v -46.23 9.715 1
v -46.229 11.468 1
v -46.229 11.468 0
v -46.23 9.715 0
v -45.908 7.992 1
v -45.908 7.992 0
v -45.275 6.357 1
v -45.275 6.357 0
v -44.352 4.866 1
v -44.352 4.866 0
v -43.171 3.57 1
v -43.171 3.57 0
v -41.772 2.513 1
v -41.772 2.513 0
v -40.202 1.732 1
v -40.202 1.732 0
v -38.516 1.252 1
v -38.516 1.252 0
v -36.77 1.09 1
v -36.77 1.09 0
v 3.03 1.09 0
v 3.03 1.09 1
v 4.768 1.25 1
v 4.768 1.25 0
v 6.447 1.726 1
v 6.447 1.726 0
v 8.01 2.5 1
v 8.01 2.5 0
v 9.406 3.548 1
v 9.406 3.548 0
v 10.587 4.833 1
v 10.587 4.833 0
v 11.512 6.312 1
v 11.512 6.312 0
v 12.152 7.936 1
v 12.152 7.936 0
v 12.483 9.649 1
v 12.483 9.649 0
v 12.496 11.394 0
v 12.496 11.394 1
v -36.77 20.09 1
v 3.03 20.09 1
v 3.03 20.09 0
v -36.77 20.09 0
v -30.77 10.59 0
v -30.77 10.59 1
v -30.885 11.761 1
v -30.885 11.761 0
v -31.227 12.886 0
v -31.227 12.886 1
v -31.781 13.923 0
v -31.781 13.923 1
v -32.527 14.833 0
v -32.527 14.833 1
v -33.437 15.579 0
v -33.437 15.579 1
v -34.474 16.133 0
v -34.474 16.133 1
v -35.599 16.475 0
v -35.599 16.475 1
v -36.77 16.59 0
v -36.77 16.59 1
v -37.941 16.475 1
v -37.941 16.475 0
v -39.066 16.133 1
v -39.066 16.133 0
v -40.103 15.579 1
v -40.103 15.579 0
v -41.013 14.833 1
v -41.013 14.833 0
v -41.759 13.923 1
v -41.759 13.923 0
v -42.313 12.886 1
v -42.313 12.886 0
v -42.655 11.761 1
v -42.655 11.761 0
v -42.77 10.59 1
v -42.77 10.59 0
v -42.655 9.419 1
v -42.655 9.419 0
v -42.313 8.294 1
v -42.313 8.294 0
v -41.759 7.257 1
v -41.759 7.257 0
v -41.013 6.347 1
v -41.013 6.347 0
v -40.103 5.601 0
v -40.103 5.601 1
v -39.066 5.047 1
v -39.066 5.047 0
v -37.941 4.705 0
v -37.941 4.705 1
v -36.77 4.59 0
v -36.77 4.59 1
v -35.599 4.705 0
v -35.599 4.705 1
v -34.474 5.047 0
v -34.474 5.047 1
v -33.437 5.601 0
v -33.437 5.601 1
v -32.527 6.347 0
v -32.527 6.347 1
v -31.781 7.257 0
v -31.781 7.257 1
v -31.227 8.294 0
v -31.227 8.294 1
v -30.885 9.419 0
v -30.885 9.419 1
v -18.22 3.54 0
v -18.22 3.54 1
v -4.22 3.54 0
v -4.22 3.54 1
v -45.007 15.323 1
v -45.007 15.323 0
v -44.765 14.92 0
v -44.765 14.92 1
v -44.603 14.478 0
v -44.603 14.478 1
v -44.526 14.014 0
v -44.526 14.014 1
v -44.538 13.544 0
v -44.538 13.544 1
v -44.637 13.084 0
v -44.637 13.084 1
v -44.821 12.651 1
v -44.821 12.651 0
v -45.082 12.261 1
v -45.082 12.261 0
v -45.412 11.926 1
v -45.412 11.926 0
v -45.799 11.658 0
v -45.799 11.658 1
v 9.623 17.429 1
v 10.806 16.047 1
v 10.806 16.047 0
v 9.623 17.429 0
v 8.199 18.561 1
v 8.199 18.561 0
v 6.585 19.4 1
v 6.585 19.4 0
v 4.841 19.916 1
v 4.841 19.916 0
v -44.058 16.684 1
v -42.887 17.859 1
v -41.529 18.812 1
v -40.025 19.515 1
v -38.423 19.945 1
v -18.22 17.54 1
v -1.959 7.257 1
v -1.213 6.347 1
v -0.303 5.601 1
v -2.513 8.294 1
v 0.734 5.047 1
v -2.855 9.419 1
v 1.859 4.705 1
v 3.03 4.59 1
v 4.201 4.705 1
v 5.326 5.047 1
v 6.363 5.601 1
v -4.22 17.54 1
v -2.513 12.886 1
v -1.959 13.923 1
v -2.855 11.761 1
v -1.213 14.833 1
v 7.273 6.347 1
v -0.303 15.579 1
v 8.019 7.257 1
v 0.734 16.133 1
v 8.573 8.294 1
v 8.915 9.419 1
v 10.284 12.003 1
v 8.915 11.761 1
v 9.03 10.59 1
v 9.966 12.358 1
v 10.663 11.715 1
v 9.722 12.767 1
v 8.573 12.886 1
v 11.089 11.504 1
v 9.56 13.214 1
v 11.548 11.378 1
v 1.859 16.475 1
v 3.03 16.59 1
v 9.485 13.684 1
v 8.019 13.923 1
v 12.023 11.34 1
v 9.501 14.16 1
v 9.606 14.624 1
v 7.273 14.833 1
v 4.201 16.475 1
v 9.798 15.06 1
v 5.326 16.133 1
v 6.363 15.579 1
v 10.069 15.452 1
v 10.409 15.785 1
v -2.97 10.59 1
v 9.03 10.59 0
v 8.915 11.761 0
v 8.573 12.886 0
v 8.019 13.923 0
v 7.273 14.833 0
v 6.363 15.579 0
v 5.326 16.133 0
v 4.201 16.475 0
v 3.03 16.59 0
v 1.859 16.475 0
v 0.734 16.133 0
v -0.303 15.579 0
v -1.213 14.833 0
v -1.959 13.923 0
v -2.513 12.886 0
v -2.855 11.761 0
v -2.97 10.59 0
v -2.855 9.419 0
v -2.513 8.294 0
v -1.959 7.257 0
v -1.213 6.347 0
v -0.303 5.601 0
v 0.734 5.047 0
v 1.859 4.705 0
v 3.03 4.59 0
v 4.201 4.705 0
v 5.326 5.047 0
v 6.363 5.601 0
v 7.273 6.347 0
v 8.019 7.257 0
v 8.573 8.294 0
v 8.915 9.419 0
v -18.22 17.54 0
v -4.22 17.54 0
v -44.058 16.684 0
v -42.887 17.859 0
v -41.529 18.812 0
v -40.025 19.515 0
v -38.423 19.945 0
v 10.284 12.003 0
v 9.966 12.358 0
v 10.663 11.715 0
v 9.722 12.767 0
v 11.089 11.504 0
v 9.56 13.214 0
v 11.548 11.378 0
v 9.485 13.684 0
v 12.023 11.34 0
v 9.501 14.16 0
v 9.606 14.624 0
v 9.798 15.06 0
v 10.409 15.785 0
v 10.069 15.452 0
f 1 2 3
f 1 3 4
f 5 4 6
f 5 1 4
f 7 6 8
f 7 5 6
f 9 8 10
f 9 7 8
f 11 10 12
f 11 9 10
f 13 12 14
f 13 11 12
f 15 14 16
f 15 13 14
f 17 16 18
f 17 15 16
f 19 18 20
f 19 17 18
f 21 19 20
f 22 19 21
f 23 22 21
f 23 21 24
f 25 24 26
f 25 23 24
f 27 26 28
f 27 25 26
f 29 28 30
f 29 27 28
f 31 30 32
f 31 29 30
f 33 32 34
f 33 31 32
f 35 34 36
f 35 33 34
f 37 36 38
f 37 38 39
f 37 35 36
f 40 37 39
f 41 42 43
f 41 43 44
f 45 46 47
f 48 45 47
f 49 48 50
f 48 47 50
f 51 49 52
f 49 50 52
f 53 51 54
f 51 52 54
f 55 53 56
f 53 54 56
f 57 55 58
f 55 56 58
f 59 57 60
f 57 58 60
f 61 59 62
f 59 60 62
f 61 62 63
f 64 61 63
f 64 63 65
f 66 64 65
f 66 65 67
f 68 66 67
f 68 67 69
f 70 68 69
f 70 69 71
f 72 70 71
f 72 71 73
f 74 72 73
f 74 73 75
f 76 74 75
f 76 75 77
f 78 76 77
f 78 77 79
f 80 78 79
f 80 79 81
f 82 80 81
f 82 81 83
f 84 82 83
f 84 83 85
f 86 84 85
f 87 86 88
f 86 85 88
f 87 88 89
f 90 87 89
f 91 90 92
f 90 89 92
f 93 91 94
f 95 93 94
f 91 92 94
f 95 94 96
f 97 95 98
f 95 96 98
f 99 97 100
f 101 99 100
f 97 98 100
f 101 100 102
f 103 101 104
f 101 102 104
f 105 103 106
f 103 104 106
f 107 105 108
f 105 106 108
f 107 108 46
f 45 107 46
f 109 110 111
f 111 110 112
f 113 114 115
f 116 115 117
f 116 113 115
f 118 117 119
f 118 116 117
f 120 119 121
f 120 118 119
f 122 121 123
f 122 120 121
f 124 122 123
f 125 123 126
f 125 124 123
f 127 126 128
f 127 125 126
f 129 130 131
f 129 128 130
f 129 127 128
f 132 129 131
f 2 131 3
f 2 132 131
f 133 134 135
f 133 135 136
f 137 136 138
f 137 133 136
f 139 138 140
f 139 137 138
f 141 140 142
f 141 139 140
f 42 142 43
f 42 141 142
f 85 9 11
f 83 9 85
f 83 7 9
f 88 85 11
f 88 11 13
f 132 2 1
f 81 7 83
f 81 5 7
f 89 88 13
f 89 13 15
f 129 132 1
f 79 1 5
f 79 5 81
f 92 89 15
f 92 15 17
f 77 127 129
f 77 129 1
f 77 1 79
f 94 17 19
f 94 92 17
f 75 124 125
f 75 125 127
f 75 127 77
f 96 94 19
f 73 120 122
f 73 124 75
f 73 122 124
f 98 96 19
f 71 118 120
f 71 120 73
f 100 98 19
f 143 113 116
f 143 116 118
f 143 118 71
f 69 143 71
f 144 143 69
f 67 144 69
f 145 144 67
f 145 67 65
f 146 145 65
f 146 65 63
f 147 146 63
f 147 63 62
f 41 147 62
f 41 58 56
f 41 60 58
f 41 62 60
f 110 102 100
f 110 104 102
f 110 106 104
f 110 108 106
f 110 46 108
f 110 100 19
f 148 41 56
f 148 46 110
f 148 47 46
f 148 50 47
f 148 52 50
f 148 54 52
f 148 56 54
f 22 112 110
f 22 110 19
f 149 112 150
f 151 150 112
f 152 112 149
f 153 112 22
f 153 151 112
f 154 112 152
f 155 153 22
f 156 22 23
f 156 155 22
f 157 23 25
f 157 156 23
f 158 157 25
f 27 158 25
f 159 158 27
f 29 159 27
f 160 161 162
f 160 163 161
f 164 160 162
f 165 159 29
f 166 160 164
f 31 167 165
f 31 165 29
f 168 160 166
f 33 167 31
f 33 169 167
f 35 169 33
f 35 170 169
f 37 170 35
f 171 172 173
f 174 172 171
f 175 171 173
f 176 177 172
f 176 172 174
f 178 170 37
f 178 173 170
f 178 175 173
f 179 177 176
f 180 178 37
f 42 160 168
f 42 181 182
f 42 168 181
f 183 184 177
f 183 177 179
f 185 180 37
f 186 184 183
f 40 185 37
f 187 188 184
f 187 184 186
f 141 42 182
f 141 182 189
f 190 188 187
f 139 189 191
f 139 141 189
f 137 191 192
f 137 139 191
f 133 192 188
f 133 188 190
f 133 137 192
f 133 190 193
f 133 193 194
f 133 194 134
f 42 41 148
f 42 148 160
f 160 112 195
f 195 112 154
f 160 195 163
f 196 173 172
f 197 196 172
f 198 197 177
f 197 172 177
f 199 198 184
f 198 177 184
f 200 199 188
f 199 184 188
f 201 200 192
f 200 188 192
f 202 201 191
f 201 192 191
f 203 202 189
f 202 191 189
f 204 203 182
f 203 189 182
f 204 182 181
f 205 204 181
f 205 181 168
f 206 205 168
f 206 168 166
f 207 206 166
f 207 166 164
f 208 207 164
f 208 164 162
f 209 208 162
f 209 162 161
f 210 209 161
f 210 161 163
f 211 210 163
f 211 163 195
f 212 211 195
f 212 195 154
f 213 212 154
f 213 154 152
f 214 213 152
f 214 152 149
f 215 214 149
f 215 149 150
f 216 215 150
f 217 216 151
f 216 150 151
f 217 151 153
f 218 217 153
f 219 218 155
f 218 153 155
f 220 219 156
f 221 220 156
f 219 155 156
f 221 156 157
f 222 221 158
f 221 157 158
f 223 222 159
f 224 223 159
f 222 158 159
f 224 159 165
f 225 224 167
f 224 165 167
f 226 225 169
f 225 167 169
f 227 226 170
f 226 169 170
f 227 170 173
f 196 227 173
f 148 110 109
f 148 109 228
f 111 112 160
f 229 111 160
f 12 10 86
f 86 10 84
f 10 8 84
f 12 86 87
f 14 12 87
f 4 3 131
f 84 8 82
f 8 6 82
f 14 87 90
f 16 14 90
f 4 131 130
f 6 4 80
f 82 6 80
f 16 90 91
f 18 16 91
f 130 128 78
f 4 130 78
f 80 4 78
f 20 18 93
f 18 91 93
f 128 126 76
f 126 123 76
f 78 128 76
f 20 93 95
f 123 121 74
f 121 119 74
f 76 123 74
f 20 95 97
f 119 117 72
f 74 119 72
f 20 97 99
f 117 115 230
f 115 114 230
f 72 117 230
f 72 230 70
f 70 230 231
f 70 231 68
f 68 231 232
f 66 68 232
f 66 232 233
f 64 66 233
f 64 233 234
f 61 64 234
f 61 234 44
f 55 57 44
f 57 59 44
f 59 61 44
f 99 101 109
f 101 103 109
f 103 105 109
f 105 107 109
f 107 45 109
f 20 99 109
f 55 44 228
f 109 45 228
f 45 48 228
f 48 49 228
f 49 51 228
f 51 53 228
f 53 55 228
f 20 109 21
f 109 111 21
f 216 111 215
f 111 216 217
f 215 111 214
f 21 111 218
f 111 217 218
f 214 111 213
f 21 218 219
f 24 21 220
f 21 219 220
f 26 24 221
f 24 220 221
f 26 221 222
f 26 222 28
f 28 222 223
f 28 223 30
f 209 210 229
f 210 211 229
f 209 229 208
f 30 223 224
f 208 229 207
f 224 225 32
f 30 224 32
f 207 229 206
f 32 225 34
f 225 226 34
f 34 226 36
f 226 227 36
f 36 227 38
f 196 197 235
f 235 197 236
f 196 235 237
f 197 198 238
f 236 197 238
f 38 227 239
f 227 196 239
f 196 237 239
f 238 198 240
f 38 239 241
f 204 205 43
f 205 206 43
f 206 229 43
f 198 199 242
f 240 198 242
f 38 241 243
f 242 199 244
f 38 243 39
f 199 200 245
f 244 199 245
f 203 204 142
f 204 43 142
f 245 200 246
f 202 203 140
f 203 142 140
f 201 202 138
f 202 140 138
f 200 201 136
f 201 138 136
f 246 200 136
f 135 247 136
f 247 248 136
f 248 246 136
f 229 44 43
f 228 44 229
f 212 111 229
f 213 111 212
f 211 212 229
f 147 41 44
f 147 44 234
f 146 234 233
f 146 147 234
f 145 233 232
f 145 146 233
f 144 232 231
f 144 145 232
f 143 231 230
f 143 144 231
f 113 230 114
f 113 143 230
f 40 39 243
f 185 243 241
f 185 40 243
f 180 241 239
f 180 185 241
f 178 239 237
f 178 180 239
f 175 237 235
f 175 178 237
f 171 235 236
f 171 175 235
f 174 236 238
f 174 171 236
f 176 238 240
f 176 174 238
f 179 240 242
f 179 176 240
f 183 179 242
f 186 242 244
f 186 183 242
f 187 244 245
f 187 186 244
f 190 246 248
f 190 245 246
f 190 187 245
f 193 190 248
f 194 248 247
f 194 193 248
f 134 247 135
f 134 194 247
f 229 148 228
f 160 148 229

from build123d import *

# Parameters (mm, degrees)
F0_R     = 1.5875
F1_DEPTH = 1
F2_R     = 1.625
F2_R_2   = 2
F2_R_3   = 6
F2_W     = 14
F2_H     = 14
F2_W_2   = 23.3
F2_H_2   = 14.8
F2_W_3   = 13
F2_H_3   = 9.9
F3_DEPTH = 1.001
F7_DEPTH = 1.001


with BuildPart() as f1:
    # F0 (on Top) → F1 (new body)
    with BuildSketch(Plane.XY):
        with BuildLine():
            Line((-53.6, -21.2), (53.6, -21.2))
            ThreePointArc((53.6, -21.2), (55.014214, -20.614214), (55.6, -19.2))
            Line((55.6, -19.2), (55.6, -10.9))
            ThreePointArc((55.6, -10.9), (55.746447, -10.546447), (56.1, -10.4))
            Line((56.1, -10.4), (61.2, -10.4))
            ThreePointArc((61.2, -10.4), (64.278275, -9.506617), (66.4, -7.104078))
            Line((66.4, -7.104078), (66.4, -2.195922))
            ThreePointArc((66.4, -2.195922), (64.278275, 0.206617), (61.2, 1.1))
            Line((61.2, 1.1), (56.1, 1.1))
            ThreePointArc((56.1, 1.1), (55.746447, 1.246447), (55.6, 1.6))
            Line((55.6, 1.6), (55.6, 9.9))
            ThreePointArc((55.6, 9.9), (55.014214, 11.314214), (53.6, 11.9))
            Line((53.6, 11.9), (28.895582, 11.9))
            ThreePointArc((28.895582, 11.9), (25.215973, 12.358319), (21.761222, 13.70527))
            Line((21.761222, 13.70527), (11.238778, 19.39473))
            ThreePointArc((11.238778, 19.39473), (7.784027, 20.741681), (4.104418, 21.2))
            Line((4.104418, 21.2), (-50.6, 21.2))
            ThreePointArc((-50.6, 21.2), (-54.135534, 19.735534), (-55.6, 16.2))
            Line((-55.6, 16.2), (-55.6, -19.2))
            ThreePointArc((-55.6, -19.2), (-55.014214, -20.614214), (-53.6, -21.2))
        make_face()
        with Locations((-52.1, -17.7)):
            Circle(F0_R, mode=Mode.SUBTRACT)
        with Locations((61.2, -4.65)):
            Circle(F0_R, mode=Mode.SUBTRACT)
        with Locations((-52.1, 17.7)):
            Circle(F0_R, mode=Mode.SUBTRACT)
    extrude(amount=F1_DEPTH)

    # F2 (on face) → F3 (cut, through all)
    with BuildSketch(Plane.XY.offset(1)):
        with Locations((-47.02, 13.84)):
            Circle(F2_R)
        with Locations((-47.02, -15.16)):
            Circle(F2_R)
        with Locations((-40.02, -12.66)):
            Circle(F2_R_2)
        with Locations((-32.72, -12.66)):
            Circle(F2_R_2)
        with Locations((-36.77, 10.59)):
            Circle(F2_R_3)
        with Locations((3.03, 10.59)):
            Circle(F2_R_3)
        with Locations((-11.22, 10.54)):
            Rectangle(F2_W, F2_H)
        with Locations((-18.02, -10.86)):
            Rectangle(F2_W_2, F2_H_2)
        with Locations((-2.32, -12.66)):
            Circle(F2_R_2)
        with Locations((4.98, -12.66)):
            Circle(F2_R_2)
        with Locations((11.98, -15.16)):
            Circle(F2_R)
        with Locations((11.98, 13.84)):
            Circle(F2_R)
        with BuildLine():
            Line((37.656189, -4.65), (48.356189, -4.65))
            ThreePointArc((48.356189, -4.65), (43.006189, 0.7), (37.656189, -4.65))
        make_face()
        with Locations((25.482554, -9.6)):
            Rectangle(F2_W_3, F2_H_3)
        with Locations((25.482554, 0.3)):
            Rectangle(F2_W_3, F2_H_3)
        with BuildLine():
            ThreePointArc((37.656189, -4.65), (43.006189, -10), (48.356189, -4.65))
            Line((48.356189, -4.65), (37.656189, -4.65))
        make_face()
    extrude(amount=-F3_DEPTH, mode=Mode.SUBTRACT)

    # F6 (on face) → F7 (intersect, through all)
    with BuildSketch(Plane.XY.offset(1)):
        with BuildLine():
            Line((3.03, 20.09), (-36.77, 20.09))
            ThreePointArc((-36.77, 20.09), (-41.528618, 18.81226), (-45.007177, 15.322749))
            ThreePointArc((-45.007177, 15.322749), (-44.636923, 13.08439), (-46.229309, 11.468332))
            ThreePointArc((-46.229309, 11.468332), (-43.791188, 4.190553), (-36.77, 1.09))
            Line((-36.77, 1.09), (3.03, 1.09))
            ThreePointArc((3.03, 1.09), (10.025937, 4.162958), (12.495933, 11.393817))
            ThreePointArc((12.495933, 11.393817), (9.630133, 12.986696), (10.806132, 16.047268))
            ThreePointArc((10.806132, 16.047268), (7.41212, 19.01894), (3.03, 20.09))
        make_face()
    extrude(amount=-F7_DEPTH, mode=Mode.INTERSECT)


solid = f1.part
